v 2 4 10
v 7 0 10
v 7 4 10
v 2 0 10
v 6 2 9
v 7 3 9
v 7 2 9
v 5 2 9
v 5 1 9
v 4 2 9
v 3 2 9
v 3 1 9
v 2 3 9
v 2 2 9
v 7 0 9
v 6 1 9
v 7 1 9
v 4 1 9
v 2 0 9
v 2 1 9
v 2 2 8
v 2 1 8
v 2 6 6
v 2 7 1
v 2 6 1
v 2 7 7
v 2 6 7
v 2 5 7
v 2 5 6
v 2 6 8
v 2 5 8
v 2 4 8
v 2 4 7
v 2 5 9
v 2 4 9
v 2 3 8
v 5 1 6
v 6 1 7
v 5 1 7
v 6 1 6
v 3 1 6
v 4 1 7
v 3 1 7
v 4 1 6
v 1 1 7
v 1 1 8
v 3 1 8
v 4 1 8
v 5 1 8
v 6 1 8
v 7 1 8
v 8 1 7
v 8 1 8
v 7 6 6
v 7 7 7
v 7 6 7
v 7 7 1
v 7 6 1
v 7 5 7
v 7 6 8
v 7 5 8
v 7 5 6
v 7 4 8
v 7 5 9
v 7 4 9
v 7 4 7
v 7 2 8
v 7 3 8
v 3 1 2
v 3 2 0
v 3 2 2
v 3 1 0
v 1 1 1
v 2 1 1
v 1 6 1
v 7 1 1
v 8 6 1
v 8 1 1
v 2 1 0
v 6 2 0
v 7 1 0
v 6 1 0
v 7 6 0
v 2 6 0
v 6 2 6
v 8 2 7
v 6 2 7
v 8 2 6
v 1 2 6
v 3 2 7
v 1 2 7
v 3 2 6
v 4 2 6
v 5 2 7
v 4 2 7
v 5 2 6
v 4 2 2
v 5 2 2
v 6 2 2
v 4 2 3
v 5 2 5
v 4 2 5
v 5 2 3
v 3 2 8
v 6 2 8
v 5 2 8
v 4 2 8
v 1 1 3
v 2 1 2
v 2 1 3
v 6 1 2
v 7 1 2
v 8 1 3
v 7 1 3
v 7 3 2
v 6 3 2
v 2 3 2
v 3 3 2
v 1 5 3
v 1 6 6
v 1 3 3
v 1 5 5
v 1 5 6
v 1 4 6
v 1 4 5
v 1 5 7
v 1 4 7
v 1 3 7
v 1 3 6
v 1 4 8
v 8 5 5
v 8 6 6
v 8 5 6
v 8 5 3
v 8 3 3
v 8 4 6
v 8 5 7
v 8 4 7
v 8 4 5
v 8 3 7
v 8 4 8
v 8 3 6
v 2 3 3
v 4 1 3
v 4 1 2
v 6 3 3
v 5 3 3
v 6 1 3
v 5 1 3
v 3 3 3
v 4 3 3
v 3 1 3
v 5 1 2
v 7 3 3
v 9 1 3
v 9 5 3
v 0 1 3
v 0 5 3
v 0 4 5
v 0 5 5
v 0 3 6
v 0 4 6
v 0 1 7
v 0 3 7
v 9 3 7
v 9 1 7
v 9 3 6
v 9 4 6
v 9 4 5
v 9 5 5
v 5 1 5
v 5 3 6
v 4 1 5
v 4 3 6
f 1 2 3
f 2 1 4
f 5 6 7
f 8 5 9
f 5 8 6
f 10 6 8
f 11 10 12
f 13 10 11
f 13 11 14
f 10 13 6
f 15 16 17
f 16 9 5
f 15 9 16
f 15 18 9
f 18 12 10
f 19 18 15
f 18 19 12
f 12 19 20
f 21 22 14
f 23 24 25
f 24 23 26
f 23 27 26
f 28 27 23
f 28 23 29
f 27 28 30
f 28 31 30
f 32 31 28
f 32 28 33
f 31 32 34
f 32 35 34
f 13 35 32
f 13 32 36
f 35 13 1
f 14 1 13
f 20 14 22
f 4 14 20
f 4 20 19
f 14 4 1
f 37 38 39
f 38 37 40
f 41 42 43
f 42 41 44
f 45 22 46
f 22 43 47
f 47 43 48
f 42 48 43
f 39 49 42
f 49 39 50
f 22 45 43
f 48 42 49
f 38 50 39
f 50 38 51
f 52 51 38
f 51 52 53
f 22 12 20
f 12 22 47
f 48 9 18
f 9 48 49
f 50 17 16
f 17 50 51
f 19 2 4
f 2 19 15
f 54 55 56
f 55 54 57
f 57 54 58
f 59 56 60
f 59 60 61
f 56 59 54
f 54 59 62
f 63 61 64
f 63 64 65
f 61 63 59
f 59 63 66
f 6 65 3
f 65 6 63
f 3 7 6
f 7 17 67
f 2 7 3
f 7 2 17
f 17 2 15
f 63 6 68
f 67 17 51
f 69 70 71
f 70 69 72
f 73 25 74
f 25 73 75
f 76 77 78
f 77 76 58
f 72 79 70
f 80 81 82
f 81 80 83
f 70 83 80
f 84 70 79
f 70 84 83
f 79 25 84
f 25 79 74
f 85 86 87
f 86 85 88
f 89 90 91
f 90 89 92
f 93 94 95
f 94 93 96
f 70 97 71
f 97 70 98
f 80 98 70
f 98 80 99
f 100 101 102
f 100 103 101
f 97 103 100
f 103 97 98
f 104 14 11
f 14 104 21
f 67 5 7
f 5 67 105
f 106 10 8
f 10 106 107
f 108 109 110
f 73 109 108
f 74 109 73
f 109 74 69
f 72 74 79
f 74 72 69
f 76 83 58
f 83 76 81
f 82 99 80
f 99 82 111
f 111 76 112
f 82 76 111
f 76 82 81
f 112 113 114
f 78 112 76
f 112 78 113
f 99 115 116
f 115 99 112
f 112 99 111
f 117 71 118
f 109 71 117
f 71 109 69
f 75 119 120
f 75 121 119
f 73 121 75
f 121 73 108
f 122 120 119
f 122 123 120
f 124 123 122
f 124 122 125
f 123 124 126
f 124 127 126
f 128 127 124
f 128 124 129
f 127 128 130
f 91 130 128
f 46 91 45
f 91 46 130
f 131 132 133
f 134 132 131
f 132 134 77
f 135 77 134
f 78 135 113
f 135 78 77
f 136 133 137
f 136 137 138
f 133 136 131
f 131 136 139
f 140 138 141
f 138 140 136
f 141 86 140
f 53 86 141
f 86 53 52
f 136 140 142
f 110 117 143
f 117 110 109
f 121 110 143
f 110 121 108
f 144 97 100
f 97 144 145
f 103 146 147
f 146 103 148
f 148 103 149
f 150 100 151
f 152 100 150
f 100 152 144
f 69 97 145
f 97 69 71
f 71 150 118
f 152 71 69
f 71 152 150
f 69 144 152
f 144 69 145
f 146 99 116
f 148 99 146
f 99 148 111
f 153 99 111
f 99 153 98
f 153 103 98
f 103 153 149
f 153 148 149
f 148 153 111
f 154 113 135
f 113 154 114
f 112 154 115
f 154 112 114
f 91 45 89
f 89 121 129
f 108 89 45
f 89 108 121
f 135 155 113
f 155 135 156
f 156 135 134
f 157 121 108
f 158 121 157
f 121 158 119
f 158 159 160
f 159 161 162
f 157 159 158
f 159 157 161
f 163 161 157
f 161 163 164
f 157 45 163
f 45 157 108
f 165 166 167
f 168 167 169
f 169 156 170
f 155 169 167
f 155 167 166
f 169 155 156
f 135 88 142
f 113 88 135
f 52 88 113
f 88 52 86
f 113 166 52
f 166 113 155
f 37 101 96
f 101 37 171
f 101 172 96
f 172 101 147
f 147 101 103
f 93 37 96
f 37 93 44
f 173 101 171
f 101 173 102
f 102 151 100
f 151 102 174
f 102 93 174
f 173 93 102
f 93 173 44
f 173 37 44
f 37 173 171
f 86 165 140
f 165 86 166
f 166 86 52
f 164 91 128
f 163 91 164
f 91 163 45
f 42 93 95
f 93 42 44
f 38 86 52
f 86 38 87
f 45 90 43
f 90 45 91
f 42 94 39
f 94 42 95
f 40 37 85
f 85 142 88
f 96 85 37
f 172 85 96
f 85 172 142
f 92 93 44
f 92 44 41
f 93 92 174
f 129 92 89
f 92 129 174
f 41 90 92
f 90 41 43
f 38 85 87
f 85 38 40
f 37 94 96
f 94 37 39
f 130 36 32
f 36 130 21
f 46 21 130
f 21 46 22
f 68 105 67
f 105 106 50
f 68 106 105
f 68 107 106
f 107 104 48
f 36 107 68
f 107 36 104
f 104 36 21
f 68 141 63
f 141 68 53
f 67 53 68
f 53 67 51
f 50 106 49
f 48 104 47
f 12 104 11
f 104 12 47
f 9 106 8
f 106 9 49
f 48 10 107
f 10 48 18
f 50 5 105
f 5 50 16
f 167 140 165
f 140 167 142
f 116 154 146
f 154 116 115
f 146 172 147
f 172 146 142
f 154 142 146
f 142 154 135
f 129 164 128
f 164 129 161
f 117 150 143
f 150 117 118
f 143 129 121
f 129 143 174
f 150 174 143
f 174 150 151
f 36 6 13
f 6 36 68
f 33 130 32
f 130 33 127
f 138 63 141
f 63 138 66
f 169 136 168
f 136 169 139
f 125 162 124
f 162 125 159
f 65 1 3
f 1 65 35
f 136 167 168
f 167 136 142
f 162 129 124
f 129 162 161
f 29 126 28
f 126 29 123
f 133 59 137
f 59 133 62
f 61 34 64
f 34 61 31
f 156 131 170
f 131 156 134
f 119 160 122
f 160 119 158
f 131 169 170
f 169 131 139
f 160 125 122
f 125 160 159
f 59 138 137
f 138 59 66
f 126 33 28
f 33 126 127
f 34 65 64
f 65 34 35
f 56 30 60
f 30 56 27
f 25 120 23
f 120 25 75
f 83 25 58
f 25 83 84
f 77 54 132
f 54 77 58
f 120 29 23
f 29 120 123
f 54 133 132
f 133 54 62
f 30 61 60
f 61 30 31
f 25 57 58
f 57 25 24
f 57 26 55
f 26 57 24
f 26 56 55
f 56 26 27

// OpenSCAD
arr=[
[[0,0,0,0,0,0,0,0,0],
 [0,0,0,0,0,0,0,0,0],
 [0,0,0,0,0,0,0,0,0],
 [0,0,0,0,0,0,0,0,0],
 [0,0,0,0,0,0,0,0,0],
 [0,0,0,0,0,0,0,0,0],
 [0,0,0,0,0,0,0,0,0],
 [0,0,0,0,0,0,0,0,0],
 [0,0,0,0,0,0,0,0,0],
 [0,0,1,1,1,1,1,0,0]],
[[0,0,1,0,0,0,1,0,0],
 [0,1,1,0,0,0,1,1,0],
 [0,1,0,1,0,1,0,1,0],
 [1,0,0,0,0,0,0,0,1],
 [1,0,0,0,0,0,0,0,1],
 [1,0,0,0,1,0,0,0,1],
 [1,0,0,1,0,1,0,0,1],
 [0,1,1,1,1,1,1,1,0],
 [0,0,3,0,3,0,3,0,0],
 [0,0,1,1,1,1,1,0,0]],
[[0,0,1,1,1,1,1,0,0],
 [0,1,1,1,1,1,1,1,0],
 [0,1,0,1,1,1,0,1,0],
 [1,0,0,0,1,0,0,0,1],
 [1,0,0,0,1,0,0,0,1],
 [1,0,0,0,1,0,0,0,1],
 [1,1,1,1,2,1,1,1,1],
 [0,1,1,1,1,1,1,1,0],
 [0,0,0,0,0,0,0,0,0],
 [0,0,1,1,1,1,1,0,0]],
[[0,0,1,1,1,1,1,0,0],
 [0,1,1,1,1,1,1,1,0],
 [0,1,1,1,1,1,1,1,0],
 [1,3,3,3,1,3,3,3,1],
 [1,3,2,3,1,3,2,3,1],
 [1,3,3,3,1,3,3,3,1],
 [0,1,1,1,1,1,1,1,0],
 [0,1,1,1,1,1,1,1,0],
 [0,0,1,1,1,1,1,0,0],
 [0,0,1,1,1,1,1,0,0]],
[[0,0,1,1,1,1,1,0,0],
 [0,1,1,1,1,1,1,1,0],
 [0,1,1,1,1,1,1,1,0],
 [1,1,1,1,1,1,1,1,1],
 [1,1,1,1,1,1,1,1,1],
 [0,1,1,1,1,1,1,1,0],
 [0,1,1,1,1,1,1,1,0],
 [0,0,1,1,1,1,1,0,0],
 [0,0,1,1,1,1,1,0,0],
 [0,0,0,0,0,0,0,0,0]],
[[0,0,1,1,1,1,1,0,0],
 [0,1,1,1,1,1,1,1,0],
 [0,1,1,1,1,1,1,1,0],
 [0,1,1,1,1,1,1,1,0],
 [0,1,1,1,1,1,1,1,0],
 [0,1,1,1,1,1,1,1,0],
 [0,0,1,1,1,1,1,0,0],
 [0,0,1,1,1,1,1,0,0]],
[[0,0,0,0,0,0,0,0,0],
 [0,0,1,1,1,1,1,0,0],
 [0,0,1,1,1,1,1,0,0],
 [0,0,1,1,1,1,1,0,0],
 [0,0,1,1,1,1,1,0,0],
 [0,0,1,1,1,1,1,0,0],
 [0,0,1,1,1,1,1,0,0]]
];
echo(len(arr));
for (y=[0:1:len(arr)-1]) for (z=[0:1:len(arr[y])-1]) for (x=[0:1:len(arr[y][z])-1]) let(f=arr[y][z][x]) {
  if (f==1) translate([x,y,z]) color("grey") cube([1,1,1]);
  if (f==2) translate([x,y,z]) color("black") cube([1,1,1]);
  if (f==3) translate([x,y,z]) color("red") cube([1,1,1]);
}
